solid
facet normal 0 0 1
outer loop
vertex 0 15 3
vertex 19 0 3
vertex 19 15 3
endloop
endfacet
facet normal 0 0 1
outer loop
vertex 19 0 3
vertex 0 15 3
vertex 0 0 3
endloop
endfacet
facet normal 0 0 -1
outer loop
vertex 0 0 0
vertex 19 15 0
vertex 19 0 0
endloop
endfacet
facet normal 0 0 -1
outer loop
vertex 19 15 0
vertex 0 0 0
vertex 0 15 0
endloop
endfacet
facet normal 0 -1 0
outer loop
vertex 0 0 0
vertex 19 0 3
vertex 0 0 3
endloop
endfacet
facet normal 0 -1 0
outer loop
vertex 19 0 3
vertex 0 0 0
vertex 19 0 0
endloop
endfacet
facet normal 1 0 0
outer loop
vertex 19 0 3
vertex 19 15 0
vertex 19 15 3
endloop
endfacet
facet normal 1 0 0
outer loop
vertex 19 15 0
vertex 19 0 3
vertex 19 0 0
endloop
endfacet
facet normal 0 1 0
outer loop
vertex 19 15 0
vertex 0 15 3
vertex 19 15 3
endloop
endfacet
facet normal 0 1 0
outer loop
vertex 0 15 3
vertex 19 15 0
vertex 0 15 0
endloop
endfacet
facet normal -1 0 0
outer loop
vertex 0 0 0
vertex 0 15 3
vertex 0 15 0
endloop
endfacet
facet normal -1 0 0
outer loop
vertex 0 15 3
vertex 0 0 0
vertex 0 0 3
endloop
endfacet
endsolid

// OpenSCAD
// Generated by SolidPython 1.0.1 on 2020-07-29 00:46:56


cube(size = [19, 15, 3]);
/***********************************************
*********      SolidPython code:      **********
************************************************
 
# import packages: SolidPython
from solid import *
from solid.utils import *
from itertools import chain, combinations, permutations


class Resize:

    def __init__(self, scad_file):
        self.scad_file = scad_file
        #self.scad_file = import_scad(scad_file)
        # cone/cylinder param:
        self.r1 = 0
        self.r2 = 0
        self.h = 0
        # rectangular prism param:
        self.w = 0
        self.l = 0
        # ellipse param:
        self.r = 0

    # import OpenScad code (file name corresponds to shape)


    # classify shape + parameters
    def assign(self, param1, param2, param3):
        if self.scad_file == 'cone.scad':
            self.r1 = param1
            self.r2 = param2
            self.h = param3
        elif self.scad_file == 'cylinder.scad':
            self.r1 = param1
            self.r2 = param2
            self.h = param3
        elif self.scad_file == 'rectangularPrism.scad':
            self.h = param1
            self.l = param2
            self.w = param3
        else:
            self.r = param1
            self.h = param2

    # resize parameters
    def iterate(self):
        x = range(3, 20, 2)
        i = 1
        if self.scad_file == 'cone.scad':
            tempList = list(permutations(x, 2))
            for temp in tempList:
                param1 = temp[0]
                param2 = temp[1]
                filepath = 'produced_scad_files/' + 'cone' + str(param1) + '_' + str(param2) + '_' + '.scad'
                scad_render_to_file(cylinder(h=param1, r1=param2, r2=0), filepath)

        elif self.scad_file == 'cylinder.scad':
            tempList = list(permutations(x, 3))
            for temp in tempList:
                param1 = temp[0]
                param2 = temp[1]
                filepath = 'produced_scad_files/' + 'cylinder' + str(param1) + '_' + str(param2) + '_' + '.scad'
                scad_render_to_file(cylinder(h=param1, r1=param2, r2=param2), filepath)

        elif self.scad_file == 'rectangularPrism.scad':
            tempList = list(permutations(x, 3))
            for temp in tempList:
                param1 = temp[0]
                param2 = temp[1]
                param3 = temp[2]
                filepath = 'produced_scad_files/' + 'rectangularPrism' + str(param1) + '_' + str(param2) + '_' + str(
                    param3) + '.scad'
                scad_render_to_file(cube(size=(param1, param2, param3)), filepath)

        elif self.scad_file == 'ellipse.scad':
            tempList = list(permutations(x, 4))
            for temp in tempList:
                param1 = temp[0]
                param2 = temp[1]
                param3 = temp[2]
                param4 = temp[3]
                filepath = 'produced_scad_files/' + 'ellipse' + str(param1) + '_' + str(param2) + '_' + str(param3) + '_' + str(param4) + '.scad'
                scad_render_to_file(scale([param1, param2, param3])(sphere(r=param4)), filepath)

    def render_to_scadfile(self):
        scad_render_to_file(scad, 'example.scad') 
 
************************************************/
